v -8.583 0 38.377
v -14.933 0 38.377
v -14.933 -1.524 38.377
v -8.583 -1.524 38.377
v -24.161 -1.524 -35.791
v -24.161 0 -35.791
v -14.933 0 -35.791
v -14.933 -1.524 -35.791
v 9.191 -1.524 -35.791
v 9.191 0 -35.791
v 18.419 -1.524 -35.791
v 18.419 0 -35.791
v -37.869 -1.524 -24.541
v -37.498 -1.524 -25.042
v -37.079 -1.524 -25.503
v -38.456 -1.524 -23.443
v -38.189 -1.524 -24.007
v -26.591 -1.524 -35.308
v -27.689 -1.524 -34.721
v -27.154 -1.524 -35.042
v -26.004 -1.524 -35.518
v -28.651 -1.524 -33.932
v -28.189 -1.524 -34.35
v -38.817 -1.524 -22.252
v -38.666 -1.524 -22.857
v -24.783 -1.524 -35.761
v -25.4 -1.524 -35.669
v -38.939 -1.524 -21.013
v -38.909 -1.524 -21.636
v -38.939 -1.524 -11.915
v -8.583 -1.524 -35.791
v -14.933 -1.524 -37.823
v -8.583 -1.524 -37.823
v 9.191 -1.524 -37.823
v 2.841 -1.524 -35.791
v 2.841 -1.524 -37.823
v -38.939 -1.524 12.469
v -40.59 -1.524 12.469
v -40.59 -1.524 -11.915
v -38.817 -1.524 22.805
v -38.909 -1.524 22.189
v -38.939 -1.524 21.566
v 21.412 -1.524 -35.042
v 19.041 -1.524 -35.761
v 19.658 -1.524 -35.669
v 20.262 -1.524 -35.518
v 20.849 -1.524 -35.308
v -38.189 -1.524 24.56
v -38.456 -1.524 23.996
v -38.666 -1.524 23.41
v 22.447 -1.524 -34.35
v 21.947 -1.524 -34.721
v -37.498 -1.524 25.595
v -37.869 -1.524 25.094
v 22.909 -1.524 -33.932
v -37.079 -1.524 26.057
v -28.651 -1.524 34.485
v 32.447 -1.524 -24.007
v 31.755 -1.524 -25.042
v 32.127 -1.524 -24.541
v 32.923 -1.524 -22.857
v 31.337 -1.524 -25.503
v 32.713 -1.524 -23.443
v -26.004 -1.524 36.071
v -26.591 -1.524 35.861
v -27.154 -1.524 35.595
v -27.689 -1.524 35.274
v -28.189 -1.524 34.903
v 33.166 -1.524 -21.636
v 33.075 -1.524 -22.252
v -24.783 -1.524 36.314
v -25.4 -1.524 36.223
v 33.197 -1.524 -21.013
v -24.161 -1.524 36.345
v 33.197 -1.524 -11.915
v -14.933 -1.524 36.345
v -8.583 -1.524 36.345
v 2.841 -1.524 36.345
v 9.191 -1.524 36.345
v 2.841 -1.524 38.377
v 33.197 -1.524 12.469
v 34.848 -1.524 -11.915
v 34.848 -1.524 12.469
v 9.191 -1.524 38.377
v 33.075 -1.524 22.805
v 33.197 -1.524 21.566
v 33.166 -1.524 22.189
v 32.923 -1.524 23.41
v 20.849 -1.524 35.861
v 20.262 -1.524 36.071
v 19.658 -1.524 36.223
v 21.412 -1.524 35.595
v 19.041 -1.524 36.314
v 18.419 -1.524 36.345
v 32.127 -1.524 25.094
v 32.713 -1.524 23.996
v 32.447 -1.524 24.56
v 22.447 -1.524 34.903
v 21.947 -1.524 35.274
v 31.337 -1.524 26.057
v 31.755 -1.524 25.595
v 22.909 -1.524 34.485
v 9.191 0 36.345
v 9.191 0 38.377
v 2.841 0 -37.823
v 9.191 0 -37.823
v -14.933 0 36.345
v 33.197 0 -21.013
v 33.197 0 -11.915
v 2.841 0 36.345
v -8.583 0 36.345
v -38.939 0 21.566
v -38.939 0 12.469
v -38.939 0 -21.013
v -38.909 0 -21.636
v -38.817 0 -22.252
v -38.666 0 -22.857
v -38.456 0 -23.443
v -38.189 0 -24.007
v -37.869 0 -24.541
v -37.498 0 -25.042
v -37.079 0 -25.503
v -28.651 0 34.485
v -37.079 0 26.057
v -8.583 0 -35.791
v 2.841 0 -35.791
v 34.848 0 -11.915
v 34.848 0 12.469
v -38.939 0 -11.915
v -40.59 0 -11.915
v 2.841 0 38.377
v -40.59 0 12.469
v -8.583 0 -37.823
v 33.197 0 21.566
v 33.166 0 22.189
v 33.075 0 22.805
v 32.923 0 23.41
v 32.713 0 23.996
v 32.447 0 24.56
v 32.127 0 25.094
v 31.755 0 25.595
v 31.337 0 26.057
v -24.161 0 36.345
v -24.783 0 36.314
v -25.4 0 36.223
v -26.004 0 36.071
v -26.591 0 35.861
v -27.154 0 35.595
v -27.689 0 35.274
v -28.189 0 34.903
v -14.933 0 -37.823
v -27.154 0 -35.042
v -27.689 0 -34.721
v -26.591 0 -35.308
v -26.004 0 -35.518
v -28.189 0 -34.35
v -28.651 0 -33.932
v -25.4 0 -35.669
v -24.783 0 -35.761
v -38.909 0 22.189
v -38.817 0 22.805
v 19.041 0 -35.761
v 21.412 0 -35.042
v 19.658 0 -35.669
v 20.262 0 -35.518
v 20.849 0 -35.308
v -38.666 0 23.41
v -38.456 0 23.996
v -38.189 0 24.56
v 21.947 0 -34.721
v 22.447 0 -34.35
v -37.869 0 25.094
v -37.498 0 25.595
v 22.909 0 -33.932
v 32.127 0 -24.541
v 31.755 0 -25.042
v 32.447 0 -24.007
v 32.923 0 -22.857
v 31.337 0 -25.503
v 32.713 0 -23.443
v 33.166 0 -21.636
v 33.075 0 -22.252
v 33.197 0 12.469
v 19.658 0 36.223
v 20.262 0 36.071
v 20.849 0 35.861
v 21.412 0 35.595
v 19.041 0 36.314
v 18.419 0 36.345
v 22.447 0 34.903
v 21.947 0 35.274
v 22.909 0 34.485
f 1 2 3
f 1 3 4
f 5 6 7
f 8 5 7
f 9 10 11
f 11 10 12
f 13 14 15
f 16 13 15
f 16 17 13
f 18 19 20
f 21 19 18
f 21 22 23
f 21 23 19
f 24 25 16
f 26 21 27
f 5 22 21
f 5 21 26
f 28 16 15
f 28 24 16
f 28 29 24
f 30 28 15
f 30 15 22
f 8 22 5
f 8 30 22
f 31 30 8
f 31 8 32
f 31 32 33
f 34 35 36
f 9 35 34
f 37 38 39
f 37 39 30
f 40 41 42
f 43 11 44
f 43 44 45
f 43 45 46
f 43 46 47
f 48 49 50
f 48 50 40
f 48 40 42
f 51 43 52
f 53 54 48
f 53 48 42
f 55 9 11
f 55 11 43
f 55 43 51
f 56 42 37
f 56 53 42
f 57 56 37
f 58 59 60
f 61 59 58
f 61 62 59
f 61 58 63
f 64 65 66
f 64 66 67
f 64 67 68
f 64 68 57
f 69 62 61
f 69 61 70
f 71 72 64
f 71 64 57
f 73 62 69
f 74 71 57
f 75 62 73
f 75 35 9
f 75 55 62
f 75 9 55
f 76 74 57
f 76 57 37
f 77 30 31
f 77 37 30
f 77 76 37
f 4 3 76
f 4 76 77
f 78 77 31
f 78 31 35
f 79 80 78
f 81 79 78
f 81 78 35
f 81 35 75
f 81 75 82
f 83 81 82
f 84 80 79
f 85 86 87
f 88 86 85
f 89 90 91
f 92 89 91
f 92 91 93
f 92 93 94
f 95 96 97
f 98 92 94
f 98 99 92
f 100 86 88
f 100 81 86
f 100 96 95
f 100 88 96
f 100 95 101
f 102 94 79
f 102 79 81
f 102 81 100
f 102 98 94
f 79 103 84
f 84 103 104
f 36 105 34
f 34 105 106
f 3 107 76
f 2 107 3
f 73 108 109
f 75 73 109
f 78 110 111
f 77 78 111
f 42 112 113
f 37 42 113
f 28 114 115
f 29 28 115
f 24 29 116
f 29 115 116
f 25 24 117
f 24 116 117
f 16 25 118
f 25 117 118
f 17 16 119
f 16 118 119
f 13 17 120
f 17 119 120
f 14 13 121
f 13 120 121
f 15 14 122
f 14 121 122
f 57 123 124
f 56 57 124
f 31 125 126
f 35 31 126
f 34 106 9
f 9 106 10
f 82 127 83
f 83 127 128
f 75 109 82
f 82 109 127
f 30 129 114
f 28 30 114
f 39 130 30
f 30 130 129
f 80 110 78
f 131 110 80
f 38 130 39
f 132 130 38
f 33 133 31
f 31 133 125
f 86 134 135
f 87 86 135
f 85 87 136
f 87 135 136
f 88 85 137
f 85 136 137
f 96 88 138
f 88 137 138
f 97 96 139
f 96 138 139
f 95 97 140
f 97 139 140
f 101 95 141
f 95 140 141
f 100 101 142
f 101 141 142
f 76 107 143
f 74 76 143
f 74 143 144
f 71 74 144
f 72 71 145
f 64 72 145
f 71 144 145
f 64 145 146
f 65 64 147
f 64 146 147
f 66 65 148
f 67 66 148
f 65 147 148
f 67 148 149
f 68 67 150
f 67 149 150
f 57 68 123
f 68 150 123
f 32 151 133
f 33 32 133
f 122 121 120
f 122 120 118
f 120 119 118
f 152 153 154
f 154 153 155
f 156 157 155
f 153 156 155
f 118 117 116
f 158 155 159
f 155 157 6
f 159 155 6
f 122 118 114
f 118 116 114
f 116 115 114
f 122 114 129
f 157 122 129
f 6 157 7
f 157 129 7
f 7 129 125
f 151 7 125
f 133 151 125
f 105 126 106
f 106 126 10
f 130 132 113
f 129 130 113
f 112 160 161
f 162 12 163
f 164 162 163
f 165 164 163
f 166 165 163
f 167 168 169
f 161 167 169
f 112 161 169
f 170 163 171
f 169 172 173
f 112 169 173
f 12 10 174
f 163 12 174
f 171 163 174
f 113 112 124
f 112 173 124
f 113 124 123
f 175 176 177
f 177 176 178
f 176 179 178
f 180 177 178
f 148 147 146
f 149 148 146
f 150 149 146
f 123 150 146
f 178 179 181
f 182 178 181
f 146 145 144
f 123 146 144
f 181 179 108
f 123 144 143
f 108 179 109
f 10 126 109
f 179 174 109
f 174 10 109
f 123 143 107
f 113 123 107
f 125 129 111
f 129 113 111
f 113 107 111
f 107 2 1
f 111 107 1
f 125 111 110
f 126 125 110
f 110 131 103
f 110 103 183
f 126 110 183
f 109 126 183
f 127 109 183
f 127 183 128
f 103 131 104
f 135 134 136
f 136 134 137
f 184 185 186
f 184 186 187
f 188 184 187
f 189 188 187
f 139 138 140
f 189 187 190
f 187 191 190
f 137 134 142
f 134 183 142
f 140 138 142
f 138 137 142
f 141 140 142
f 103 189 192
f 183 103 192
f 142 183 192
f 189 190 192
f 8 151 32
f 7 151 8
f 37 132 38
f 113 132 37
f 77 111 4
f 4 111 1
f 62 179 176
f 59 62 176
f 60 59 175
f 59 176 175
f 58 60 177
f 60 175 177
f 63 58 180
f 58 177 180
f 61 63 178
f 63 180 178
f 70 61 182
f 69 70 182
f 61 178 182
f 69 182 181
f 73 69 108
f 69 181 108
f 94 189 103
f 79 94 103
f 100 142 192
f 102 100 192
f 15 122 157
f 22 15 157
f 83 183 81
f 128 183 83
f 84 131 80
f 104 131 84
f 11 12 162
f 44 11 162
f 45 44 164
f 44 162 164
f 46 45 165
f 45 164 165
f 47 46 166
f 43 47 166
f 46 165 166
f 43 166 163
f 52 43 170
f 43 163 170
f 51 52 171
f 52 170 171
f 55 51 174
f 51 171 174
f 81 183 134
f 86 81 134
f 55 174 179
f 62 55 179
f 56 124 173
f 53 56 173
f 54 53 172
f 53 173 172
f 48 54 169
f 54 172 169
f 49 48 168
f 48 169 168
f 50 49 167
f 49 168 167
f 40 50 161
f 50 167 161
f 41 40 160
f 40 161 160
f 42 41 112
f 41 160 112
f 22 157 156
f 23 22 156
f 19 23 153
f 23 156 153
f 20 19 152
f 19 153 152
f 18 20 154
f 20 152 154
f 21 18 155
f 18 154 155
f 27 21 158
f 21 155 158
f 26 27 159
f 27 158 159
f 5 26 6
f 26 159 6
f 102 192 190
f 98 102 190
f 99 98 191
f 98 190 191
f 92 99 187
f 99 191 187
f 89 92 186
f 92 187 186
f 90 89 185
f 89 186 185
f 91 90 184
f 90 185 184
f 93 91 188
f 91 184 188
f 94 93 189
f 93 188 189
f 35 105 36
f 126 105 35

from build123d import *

# Parameters (mm, degrees)
F0_W     = 6.35
F0_H     = 2.032
F0_W_2   = 72.136
F0_H_2   = 24.384
F0_W_3   = 1.651
F1_DEPTH = 1.524


with BuildPart() as f1:
    # F0 (on Front) → F1 (new body)
    with BuildSketch(Plane.XZ):
        with BuildLine():
            Line((18.418700083, 36.344532257), (9.1906381628, 36.344532257))
            Line((9.1906381628, 36.344532257), (2.8406381628, 36.344532257))
            Line((2.8406381628, 36.344532257), (-8.5829475322, 36.344532257))
            Line((-8.5829475322, 36.344532257), (-14.9329475322, 36.344532257))
            Line((-14.9329475322, 36.344532257), (-24.1610094524, 36.344532257))
            ThreePointArc((-24.1610094524, 36.344532257), (-26.5910492479, 35.8611672884), (-28.6511375129, 34.4846603175))
            Line((-28.6511375129, 34.4846603175), (-37.0792827452, 26.0565150852))
            ThreePointArc((-37.0792827452, 26.0565150852), (-38.4557897162, 23.9964268202), (-38.9391546847, 21.5663870246))
            Line((-38.9391546847, 21.5663870246), (-38.9391546847, 12.468532257))
            Line((-38.9391546847, 12.468532257), (33.1968453153, 12.468532257))
            Line((33.1968453153, 12.468532257), (33.1968453153, 21.5663870246))
            ThreePointArc((33.1968453153, 21.5663870246), (32.7134803467, 23.9964268202), (31.3369733758, 26.0565150852))
            Line((31.3369733758, 26.0565150852), (22.9088281435, 34.4846603175))
            ThreePointArc((22.9088281435, 34.4846603175), (20.8487398785, 35.8611672884), (18.418700083, 36.344532257))
        make_face()
        with Locations((-11.7579475322, 37.360532257)):
            Rectangle(F0_W, F0_H)
        with Locations((6.0156381628, 37.360532257)):
            Rectangle(F0_W, F0_H)
        with Locations((-11.7579475322, -36.807467743)):
            Rectangle(F0_W, F0_H)
        with Locations((6.0156381628, -36.807467743)):
            Rectangle(F0_W, F0_H)
        with BuildLine():
            Line((33.1968453153, -21.0133225107), (33.1968453153, -11.915467743))
            Line((33.1968453153, -11.915467743), (-38.9391546847, -11.915467743))
            Line((-38.9391546847, -11.915467743), (-38.9391546847, -21.0133225107))
            ThreePointArc((-38.9391546847, -21.0133225107), (-38.4557897162, -23.4433623062), (-37.0792827452, -25.5034505712))
            Line((-37.0792827452, -25.5034505712), (-28.6511375129, -33.9315958036))
            ThreePointArc((-28.6511375129, -33.9315958036), (-26.5910492479, -35.3081027745), (-24.1610094524, -35.791467743))
            Line((-24.1610094524, -35.791467743), (-14.9329475322, -35.791467743))
            Line((-14.9329475322, -35.791467743), (-8.5829475322, -35.791467743))
            Line((-8.5829475322, -35.791467743), (2.8406381628, -35.791467743))
            Line((2.8406381628, -35.791467743), (9.1906381628, -35.791467743))
            Line((9.1906381628, -35.791467743), (18.418700083, -35.791467743))
            ThreePointArc((18.418700083, -35.791467743), (20.8487398785, -35.3081027745), (22.9088281435, -33.9315958036))
            Line((22.9088281435, -33.9315958036), (31.3369733758, -25.5034505712))
            ThreePointArc((31.3369733758, -25.5034505712), (32.7134803467, -23.4433623062), (33.1968453153, -21.0133225107))
        make_face()
        with Locations((-2.8711546847, 0.276532257)):
            Rectangle(F0_W_2, F0_H_2)
        with Locations((-39.7646546847, 0.276532257)):
            Rectangle(F0_W_3, F0_H_2)
        with Locations((34.0223453153, 0.276532257)):
            Rectangle(F0_W_3, F0_H_2)
    extrude(amount=F1_DEPTH)


solid = f1.part
